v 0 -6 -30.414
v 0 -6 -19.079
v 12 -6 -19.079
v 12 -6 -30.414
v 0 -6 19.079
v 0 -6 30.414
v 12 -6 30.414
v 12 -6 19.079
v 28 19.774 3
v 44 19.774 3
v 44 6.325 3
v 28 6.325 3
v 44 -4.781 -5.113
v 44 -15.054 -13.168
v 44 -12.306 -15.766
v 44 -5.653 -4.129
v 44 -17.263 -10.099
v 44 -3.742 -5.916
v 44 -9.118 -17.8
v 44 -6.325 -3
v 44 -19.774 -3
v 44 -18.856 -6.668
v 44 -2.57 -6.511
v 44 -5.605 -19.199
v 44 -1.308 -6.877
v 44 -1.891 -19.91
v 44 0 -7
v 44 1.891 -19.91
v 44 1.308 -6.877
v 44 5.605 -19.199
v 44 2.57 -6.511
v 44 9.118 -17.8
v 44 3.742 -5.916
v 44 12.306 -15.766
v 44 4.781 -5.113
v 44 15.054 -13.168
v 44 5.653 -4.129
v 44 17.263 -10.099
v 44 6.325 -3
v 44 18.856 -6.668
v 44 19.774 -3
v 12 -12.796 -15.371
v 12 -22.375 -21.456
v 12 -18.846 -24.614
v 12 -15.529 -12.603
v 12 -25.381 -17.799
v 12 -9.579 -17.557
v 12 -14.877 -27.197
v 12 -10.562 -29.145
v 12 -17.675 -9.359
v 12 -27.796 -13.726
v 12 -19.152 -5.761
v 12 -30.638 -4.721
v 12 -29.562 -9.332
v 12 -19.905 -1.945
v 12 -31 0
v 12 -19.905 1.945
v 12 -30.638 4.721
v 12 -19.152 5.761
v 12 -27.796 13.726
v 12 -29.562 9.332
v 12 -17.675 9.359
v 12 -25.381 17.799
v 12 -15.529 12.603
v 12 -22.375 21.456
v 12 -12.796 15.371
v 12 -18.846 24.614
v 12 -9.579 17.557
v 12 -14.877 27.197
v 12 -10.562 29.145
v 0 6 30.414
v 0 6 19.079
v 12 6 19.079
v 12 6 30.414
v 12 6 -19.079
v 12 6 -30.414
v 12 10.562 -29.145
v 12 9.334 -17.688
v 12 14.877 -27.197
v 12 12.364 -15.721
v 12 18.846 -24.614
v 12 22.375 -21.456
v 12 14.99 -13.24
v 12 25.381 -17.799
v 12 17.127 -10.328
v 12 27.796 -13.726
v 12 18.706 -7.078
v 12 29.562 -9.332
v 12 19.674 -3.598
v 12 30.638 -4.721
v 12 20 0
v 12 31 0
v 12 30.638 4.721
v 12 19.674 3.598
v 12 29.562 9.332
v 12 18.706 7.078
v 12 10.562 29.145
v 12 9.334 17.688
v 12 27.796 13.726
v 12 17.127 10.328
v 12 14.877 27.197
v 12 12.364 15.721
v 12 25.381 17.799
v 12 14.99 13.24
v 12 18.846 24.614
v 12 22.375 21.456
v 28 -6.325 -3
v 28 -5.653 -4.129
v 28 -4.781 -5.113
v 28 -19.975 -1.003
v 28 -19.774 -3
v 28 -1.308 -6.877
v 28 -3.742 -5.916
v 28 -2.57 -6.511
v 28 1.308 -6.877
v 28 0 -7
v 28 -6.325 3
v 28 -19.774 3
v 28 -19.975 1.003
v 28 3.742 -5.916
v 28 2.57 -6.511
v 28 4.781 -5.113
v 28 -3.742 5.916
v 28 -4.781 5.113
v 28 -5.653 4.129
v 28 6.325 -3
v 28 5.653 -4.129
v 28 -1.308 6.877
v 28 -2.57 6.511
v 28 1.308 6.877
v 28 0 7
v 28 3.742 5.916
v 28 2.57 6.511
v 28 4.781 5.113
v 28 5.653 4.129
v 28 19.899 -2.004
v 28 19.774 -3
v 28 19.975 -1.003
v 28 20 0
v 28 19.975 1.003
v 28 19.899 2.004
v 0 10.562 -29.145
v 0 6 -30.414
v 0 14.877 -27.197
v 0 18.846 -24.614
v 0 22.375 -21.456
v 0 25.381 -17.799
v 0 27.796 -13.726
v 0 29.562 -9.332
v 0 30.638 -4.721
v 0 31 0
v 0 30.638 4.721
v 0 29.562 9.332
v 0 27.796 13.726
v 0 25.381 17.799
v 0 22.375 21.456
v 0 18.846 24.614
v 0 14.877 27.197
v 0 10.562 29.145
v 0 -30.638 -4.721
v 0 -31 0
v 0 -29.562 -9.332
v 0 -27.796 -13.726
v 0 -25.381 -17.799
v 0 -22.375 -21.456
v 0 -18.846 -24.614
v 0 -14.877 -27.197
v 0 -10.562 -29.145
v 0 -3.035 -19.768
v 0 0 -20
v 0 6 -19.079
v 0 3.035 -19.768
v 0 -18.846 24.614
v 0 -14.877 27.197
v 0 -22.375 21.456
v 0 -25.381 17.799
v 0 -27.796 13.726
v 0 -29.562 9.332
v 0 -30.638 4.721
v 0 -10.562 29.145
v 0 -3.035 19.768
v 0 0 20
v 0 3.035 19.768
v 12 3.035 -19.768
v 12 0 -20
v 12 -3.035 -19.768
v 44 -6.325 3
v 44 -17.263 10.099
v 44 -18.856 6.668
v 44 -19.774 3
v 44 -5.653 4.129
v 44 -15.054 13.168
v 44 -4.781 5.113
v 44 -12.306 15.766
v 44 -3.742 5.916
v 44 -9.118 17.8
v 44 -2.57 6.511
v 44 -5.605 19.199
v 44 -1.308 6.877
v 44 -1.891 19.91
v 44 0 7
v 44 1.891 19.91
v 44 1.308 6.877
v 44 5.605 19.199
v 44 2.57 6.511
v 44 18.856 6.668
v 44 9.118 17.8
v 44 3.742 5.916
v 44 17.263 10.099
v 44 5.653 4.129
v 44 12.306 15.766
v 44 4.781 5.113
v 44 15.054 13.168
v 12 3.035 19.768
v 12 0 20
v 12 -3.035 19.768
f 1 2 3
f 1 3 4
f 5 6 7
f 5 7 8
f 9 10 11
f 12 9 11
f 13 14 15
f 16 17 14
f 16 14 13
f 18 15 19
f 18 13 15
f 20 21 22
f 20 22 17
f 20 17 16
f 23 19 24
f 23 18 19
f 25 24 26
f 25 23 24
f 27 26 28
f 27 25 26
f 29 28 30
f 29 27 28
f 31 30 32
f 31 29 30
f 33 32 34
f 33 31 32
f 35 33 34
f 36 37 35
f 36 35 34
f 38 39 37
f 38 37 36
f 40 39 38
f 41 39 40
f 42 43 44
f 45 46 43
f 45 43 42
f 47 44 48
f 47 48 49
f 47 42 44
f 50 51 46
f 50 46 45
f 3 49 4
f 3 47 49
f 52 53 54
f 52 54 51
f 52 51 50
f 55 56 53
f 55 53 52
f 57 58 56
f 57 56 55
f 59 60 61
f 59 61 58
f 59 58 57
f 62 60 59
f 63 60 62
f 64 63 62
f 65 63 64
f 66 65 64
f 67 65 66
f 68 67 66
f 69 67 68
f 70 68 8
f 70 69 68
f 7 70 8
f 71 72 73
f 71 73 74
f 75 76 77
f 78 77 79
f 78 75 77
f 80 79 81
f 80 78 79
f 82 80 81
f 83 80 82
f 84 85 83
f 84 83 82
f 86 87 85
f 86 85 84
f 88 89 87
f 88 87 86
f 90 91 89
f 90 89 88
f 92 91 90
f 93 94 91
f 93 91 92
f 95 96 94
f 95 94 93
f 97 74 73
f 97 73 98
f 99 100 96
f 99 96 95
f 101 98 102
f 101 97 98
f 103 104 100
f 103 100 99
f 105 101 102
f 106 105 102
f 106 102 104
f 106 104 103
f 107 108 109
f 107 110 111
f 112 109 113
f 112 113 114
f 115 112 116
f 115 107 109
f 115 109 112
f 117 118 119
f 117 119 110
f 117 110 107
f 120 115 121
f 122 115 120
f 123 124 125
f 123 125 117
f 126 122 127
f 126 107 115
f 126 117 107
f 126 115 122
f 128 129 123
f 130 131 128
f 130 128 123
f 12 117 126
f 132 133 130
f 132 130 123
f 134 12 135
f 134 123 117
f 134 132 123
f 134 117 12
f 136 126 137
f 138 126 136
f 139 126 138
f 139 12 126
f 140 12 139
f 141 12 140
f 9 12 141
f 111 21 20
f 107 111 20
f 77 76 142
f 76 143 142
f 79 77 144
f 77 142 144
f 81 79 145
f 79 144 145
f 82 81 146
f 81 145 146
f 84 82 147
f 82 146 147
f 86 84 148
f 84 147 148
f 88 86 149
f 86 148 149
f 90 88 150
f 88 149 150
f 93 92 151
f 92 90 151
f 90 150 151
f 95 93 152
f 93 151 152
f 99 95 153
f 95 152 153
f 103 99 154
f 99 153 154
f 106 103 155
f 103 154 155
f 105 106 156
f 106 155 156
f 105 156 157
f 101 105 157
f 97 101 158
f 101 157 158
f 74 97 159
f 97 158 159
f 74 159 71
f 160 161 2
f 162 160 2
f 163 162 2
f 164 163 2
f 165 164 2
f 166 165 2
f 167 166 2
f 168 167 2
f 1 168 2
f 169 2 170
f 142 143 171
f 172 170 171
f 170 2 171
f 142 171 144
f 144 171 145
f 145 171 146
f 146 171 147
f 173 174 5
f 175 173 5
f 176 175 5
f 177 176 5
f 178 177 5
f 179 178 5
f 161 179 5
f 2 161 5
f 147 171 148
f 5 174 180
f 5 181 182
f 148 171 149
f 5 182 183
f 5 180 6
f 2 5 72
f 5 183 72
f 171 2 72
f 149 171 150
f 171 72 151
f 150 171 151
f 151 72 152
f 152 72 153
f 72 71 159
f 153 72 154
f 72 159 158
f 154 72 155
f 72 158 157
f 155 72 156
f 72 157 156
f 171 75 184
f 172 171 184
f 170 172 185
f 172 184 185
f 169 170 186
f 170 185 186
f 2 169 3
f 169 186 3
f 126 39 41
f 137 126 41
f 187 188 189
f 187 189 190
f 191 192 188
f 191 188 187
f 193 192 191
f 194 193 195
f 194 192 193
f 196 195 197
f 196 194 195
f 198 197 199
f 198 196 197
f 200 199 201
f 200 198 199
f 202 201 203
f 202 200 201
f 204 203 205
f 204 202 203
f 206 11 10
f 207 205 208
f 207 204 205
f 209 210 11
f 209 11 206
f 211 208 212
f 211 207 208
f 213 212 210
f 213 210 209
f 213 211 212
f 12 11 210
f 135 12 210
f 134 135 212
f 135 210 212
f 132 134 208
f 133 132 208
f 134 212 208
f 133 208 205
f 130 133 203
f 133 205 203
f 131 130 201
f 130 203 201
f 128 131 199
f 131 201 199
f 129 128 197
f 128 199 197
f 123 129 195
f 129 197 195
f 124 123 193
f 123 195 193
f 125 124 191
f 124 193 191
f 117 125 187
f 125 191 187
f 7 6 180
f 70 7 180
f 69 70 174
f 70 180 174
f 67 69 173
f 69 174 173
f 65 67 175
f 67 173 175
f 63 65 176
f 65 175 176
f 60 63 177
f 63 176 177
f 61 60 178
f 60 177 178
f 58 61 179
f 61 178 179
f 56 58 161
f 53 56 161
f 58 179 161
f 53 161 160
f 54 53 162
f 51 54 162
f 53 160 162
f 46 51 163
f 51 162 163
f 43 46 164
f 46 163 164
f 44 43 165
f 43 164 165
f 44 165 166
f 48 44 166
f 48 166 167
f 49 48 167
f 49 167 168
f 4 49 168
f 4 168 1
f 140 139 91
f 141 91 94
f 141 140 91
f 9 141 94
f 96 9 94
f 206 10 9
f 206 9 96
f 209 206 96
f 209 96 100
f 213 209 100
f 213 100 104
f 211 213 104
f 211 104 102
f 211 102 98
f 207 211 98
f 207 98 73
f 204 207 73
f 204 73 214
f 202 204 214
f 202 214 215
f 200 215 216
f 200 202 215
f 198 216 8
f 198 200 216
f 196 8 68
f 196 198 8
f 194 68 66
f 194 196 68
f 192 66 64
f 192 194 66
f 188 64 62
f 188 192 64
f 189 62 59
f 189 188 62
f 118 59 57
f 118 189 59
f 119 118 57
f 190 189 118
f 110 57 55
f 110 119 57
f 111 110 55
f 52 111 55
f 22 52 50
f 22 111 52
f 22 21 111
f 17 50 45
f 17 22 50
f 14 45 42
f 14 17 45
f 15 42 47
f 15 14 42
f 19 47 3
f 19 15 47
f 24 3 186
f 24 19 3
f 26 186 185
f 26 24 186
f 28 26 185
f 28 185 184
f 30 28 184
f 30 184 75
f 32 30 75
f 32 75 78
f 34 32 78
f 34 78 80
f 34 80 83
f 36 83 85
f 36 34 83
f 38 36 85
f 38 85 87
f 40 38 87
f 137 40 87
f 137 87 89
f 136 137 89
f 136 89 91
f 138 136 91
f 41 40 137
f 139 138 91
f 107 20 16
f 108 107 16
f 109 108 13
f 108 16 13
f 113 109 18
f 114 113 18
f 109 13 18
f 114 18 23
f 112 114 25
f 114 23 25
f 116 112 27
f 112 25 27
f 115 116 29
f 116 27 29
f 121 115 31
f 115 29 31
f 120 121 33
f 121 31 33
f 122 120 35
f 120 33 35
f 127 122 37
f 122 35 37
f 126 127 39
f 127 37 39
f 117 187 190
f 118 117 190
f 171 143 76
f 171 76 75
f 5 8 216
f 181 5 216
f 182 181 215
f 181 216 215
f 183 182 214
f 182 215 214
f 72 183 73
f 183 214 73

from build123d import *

# Parameters (mm, degrees)
F0_R     = 31
F1_DEPTH = 44
F2_R     = 31
F2_R_2   = 20
F3_DEPTH = 32
F5_DEPTH = 25
F7_DEPTH = 16


with BuildPart() as f1:
    # F0 (on Right) → F1 (new body)
    with BuildSketch(Plane.YZ):
        Circle(F0_R)
    extrude(amount=F1_DEPTH)

    # F2 (on face) → F3 (cut)
    with BuildSketch(Plane.YZ.offset(44)):
        Circle(F2_R)
        Circle(F2_R_2, mode=Mode.SUBTRACT)
    extrude(amount=-F3_DEPTH, mode=Mode.SUBTRACT)

    # F4 (on face) → F5 (cut)
    with BuildSketch(Plane.YZ.offset(12)):
        with BuildLine():
            ThreePointArc((6, 30.4138126515), (0, 31), (-6, 30.4138126515))
            Line((-6, 30.4138126515), (-6, 19.0787840283))
            ThreePointArc((-6, 19.0787840283), (0, 20), (6, 19.0787840283))
            Line((6, 19.0787840283), (6, 30.4138126515))
        make_face()
        with BuildLine():
            Line((-6, -19.0787840283), (-6, -30.4138126515))
            ThreePointArc((-6, -30.4138126515), (0, -31), (6, -30.4138126515))
            Line((6, -30.4138126515), (6, -19.0787840283))
            ThreePointArc((6, -19.0787840283), (0, -20), (-6, -19.0787840283))
        make_face()
    extrude(amount=-F5_DEPTH, mode=Mode.SUBTRACT)

    # F6 (on face) → F7 (cut)
    with BuildSketch(Plane.YZ.offset(44)):
        with BuildLine():
            Line((-19.7737199333, -3), (-6.3245553203, -3))
            ThreePointArc((-6.3245553203, -3), (0, -7), (6.3245553203, -3))
            Line((6.3245553203, -3), (19.7737199333, -3))
            ThreePointArc((19.7737199333, -3), (19.9433497521, -1.5042608375), (20, 0))
            ThreePointArc((20, 0), (19.9433497521, 1.5042608375), (19.7737199333, 3))
            Line((19.7737199333, 3), (6.3245553203, 3))
            ThreePointArc((6.3245553203, 3), (0, 7), (-6.3245553203, 3))
            Line((-6.3245553203, 3), (-19.7737199333, 3))
            ThreePointArc((-19.7737199333, 3), (-20, 0), (-19.7737199333, -3))
        make_face()
    extrude(amount=-F7_DEPTH, mode=Mode.SUBTRACT)


solid = f1.part
